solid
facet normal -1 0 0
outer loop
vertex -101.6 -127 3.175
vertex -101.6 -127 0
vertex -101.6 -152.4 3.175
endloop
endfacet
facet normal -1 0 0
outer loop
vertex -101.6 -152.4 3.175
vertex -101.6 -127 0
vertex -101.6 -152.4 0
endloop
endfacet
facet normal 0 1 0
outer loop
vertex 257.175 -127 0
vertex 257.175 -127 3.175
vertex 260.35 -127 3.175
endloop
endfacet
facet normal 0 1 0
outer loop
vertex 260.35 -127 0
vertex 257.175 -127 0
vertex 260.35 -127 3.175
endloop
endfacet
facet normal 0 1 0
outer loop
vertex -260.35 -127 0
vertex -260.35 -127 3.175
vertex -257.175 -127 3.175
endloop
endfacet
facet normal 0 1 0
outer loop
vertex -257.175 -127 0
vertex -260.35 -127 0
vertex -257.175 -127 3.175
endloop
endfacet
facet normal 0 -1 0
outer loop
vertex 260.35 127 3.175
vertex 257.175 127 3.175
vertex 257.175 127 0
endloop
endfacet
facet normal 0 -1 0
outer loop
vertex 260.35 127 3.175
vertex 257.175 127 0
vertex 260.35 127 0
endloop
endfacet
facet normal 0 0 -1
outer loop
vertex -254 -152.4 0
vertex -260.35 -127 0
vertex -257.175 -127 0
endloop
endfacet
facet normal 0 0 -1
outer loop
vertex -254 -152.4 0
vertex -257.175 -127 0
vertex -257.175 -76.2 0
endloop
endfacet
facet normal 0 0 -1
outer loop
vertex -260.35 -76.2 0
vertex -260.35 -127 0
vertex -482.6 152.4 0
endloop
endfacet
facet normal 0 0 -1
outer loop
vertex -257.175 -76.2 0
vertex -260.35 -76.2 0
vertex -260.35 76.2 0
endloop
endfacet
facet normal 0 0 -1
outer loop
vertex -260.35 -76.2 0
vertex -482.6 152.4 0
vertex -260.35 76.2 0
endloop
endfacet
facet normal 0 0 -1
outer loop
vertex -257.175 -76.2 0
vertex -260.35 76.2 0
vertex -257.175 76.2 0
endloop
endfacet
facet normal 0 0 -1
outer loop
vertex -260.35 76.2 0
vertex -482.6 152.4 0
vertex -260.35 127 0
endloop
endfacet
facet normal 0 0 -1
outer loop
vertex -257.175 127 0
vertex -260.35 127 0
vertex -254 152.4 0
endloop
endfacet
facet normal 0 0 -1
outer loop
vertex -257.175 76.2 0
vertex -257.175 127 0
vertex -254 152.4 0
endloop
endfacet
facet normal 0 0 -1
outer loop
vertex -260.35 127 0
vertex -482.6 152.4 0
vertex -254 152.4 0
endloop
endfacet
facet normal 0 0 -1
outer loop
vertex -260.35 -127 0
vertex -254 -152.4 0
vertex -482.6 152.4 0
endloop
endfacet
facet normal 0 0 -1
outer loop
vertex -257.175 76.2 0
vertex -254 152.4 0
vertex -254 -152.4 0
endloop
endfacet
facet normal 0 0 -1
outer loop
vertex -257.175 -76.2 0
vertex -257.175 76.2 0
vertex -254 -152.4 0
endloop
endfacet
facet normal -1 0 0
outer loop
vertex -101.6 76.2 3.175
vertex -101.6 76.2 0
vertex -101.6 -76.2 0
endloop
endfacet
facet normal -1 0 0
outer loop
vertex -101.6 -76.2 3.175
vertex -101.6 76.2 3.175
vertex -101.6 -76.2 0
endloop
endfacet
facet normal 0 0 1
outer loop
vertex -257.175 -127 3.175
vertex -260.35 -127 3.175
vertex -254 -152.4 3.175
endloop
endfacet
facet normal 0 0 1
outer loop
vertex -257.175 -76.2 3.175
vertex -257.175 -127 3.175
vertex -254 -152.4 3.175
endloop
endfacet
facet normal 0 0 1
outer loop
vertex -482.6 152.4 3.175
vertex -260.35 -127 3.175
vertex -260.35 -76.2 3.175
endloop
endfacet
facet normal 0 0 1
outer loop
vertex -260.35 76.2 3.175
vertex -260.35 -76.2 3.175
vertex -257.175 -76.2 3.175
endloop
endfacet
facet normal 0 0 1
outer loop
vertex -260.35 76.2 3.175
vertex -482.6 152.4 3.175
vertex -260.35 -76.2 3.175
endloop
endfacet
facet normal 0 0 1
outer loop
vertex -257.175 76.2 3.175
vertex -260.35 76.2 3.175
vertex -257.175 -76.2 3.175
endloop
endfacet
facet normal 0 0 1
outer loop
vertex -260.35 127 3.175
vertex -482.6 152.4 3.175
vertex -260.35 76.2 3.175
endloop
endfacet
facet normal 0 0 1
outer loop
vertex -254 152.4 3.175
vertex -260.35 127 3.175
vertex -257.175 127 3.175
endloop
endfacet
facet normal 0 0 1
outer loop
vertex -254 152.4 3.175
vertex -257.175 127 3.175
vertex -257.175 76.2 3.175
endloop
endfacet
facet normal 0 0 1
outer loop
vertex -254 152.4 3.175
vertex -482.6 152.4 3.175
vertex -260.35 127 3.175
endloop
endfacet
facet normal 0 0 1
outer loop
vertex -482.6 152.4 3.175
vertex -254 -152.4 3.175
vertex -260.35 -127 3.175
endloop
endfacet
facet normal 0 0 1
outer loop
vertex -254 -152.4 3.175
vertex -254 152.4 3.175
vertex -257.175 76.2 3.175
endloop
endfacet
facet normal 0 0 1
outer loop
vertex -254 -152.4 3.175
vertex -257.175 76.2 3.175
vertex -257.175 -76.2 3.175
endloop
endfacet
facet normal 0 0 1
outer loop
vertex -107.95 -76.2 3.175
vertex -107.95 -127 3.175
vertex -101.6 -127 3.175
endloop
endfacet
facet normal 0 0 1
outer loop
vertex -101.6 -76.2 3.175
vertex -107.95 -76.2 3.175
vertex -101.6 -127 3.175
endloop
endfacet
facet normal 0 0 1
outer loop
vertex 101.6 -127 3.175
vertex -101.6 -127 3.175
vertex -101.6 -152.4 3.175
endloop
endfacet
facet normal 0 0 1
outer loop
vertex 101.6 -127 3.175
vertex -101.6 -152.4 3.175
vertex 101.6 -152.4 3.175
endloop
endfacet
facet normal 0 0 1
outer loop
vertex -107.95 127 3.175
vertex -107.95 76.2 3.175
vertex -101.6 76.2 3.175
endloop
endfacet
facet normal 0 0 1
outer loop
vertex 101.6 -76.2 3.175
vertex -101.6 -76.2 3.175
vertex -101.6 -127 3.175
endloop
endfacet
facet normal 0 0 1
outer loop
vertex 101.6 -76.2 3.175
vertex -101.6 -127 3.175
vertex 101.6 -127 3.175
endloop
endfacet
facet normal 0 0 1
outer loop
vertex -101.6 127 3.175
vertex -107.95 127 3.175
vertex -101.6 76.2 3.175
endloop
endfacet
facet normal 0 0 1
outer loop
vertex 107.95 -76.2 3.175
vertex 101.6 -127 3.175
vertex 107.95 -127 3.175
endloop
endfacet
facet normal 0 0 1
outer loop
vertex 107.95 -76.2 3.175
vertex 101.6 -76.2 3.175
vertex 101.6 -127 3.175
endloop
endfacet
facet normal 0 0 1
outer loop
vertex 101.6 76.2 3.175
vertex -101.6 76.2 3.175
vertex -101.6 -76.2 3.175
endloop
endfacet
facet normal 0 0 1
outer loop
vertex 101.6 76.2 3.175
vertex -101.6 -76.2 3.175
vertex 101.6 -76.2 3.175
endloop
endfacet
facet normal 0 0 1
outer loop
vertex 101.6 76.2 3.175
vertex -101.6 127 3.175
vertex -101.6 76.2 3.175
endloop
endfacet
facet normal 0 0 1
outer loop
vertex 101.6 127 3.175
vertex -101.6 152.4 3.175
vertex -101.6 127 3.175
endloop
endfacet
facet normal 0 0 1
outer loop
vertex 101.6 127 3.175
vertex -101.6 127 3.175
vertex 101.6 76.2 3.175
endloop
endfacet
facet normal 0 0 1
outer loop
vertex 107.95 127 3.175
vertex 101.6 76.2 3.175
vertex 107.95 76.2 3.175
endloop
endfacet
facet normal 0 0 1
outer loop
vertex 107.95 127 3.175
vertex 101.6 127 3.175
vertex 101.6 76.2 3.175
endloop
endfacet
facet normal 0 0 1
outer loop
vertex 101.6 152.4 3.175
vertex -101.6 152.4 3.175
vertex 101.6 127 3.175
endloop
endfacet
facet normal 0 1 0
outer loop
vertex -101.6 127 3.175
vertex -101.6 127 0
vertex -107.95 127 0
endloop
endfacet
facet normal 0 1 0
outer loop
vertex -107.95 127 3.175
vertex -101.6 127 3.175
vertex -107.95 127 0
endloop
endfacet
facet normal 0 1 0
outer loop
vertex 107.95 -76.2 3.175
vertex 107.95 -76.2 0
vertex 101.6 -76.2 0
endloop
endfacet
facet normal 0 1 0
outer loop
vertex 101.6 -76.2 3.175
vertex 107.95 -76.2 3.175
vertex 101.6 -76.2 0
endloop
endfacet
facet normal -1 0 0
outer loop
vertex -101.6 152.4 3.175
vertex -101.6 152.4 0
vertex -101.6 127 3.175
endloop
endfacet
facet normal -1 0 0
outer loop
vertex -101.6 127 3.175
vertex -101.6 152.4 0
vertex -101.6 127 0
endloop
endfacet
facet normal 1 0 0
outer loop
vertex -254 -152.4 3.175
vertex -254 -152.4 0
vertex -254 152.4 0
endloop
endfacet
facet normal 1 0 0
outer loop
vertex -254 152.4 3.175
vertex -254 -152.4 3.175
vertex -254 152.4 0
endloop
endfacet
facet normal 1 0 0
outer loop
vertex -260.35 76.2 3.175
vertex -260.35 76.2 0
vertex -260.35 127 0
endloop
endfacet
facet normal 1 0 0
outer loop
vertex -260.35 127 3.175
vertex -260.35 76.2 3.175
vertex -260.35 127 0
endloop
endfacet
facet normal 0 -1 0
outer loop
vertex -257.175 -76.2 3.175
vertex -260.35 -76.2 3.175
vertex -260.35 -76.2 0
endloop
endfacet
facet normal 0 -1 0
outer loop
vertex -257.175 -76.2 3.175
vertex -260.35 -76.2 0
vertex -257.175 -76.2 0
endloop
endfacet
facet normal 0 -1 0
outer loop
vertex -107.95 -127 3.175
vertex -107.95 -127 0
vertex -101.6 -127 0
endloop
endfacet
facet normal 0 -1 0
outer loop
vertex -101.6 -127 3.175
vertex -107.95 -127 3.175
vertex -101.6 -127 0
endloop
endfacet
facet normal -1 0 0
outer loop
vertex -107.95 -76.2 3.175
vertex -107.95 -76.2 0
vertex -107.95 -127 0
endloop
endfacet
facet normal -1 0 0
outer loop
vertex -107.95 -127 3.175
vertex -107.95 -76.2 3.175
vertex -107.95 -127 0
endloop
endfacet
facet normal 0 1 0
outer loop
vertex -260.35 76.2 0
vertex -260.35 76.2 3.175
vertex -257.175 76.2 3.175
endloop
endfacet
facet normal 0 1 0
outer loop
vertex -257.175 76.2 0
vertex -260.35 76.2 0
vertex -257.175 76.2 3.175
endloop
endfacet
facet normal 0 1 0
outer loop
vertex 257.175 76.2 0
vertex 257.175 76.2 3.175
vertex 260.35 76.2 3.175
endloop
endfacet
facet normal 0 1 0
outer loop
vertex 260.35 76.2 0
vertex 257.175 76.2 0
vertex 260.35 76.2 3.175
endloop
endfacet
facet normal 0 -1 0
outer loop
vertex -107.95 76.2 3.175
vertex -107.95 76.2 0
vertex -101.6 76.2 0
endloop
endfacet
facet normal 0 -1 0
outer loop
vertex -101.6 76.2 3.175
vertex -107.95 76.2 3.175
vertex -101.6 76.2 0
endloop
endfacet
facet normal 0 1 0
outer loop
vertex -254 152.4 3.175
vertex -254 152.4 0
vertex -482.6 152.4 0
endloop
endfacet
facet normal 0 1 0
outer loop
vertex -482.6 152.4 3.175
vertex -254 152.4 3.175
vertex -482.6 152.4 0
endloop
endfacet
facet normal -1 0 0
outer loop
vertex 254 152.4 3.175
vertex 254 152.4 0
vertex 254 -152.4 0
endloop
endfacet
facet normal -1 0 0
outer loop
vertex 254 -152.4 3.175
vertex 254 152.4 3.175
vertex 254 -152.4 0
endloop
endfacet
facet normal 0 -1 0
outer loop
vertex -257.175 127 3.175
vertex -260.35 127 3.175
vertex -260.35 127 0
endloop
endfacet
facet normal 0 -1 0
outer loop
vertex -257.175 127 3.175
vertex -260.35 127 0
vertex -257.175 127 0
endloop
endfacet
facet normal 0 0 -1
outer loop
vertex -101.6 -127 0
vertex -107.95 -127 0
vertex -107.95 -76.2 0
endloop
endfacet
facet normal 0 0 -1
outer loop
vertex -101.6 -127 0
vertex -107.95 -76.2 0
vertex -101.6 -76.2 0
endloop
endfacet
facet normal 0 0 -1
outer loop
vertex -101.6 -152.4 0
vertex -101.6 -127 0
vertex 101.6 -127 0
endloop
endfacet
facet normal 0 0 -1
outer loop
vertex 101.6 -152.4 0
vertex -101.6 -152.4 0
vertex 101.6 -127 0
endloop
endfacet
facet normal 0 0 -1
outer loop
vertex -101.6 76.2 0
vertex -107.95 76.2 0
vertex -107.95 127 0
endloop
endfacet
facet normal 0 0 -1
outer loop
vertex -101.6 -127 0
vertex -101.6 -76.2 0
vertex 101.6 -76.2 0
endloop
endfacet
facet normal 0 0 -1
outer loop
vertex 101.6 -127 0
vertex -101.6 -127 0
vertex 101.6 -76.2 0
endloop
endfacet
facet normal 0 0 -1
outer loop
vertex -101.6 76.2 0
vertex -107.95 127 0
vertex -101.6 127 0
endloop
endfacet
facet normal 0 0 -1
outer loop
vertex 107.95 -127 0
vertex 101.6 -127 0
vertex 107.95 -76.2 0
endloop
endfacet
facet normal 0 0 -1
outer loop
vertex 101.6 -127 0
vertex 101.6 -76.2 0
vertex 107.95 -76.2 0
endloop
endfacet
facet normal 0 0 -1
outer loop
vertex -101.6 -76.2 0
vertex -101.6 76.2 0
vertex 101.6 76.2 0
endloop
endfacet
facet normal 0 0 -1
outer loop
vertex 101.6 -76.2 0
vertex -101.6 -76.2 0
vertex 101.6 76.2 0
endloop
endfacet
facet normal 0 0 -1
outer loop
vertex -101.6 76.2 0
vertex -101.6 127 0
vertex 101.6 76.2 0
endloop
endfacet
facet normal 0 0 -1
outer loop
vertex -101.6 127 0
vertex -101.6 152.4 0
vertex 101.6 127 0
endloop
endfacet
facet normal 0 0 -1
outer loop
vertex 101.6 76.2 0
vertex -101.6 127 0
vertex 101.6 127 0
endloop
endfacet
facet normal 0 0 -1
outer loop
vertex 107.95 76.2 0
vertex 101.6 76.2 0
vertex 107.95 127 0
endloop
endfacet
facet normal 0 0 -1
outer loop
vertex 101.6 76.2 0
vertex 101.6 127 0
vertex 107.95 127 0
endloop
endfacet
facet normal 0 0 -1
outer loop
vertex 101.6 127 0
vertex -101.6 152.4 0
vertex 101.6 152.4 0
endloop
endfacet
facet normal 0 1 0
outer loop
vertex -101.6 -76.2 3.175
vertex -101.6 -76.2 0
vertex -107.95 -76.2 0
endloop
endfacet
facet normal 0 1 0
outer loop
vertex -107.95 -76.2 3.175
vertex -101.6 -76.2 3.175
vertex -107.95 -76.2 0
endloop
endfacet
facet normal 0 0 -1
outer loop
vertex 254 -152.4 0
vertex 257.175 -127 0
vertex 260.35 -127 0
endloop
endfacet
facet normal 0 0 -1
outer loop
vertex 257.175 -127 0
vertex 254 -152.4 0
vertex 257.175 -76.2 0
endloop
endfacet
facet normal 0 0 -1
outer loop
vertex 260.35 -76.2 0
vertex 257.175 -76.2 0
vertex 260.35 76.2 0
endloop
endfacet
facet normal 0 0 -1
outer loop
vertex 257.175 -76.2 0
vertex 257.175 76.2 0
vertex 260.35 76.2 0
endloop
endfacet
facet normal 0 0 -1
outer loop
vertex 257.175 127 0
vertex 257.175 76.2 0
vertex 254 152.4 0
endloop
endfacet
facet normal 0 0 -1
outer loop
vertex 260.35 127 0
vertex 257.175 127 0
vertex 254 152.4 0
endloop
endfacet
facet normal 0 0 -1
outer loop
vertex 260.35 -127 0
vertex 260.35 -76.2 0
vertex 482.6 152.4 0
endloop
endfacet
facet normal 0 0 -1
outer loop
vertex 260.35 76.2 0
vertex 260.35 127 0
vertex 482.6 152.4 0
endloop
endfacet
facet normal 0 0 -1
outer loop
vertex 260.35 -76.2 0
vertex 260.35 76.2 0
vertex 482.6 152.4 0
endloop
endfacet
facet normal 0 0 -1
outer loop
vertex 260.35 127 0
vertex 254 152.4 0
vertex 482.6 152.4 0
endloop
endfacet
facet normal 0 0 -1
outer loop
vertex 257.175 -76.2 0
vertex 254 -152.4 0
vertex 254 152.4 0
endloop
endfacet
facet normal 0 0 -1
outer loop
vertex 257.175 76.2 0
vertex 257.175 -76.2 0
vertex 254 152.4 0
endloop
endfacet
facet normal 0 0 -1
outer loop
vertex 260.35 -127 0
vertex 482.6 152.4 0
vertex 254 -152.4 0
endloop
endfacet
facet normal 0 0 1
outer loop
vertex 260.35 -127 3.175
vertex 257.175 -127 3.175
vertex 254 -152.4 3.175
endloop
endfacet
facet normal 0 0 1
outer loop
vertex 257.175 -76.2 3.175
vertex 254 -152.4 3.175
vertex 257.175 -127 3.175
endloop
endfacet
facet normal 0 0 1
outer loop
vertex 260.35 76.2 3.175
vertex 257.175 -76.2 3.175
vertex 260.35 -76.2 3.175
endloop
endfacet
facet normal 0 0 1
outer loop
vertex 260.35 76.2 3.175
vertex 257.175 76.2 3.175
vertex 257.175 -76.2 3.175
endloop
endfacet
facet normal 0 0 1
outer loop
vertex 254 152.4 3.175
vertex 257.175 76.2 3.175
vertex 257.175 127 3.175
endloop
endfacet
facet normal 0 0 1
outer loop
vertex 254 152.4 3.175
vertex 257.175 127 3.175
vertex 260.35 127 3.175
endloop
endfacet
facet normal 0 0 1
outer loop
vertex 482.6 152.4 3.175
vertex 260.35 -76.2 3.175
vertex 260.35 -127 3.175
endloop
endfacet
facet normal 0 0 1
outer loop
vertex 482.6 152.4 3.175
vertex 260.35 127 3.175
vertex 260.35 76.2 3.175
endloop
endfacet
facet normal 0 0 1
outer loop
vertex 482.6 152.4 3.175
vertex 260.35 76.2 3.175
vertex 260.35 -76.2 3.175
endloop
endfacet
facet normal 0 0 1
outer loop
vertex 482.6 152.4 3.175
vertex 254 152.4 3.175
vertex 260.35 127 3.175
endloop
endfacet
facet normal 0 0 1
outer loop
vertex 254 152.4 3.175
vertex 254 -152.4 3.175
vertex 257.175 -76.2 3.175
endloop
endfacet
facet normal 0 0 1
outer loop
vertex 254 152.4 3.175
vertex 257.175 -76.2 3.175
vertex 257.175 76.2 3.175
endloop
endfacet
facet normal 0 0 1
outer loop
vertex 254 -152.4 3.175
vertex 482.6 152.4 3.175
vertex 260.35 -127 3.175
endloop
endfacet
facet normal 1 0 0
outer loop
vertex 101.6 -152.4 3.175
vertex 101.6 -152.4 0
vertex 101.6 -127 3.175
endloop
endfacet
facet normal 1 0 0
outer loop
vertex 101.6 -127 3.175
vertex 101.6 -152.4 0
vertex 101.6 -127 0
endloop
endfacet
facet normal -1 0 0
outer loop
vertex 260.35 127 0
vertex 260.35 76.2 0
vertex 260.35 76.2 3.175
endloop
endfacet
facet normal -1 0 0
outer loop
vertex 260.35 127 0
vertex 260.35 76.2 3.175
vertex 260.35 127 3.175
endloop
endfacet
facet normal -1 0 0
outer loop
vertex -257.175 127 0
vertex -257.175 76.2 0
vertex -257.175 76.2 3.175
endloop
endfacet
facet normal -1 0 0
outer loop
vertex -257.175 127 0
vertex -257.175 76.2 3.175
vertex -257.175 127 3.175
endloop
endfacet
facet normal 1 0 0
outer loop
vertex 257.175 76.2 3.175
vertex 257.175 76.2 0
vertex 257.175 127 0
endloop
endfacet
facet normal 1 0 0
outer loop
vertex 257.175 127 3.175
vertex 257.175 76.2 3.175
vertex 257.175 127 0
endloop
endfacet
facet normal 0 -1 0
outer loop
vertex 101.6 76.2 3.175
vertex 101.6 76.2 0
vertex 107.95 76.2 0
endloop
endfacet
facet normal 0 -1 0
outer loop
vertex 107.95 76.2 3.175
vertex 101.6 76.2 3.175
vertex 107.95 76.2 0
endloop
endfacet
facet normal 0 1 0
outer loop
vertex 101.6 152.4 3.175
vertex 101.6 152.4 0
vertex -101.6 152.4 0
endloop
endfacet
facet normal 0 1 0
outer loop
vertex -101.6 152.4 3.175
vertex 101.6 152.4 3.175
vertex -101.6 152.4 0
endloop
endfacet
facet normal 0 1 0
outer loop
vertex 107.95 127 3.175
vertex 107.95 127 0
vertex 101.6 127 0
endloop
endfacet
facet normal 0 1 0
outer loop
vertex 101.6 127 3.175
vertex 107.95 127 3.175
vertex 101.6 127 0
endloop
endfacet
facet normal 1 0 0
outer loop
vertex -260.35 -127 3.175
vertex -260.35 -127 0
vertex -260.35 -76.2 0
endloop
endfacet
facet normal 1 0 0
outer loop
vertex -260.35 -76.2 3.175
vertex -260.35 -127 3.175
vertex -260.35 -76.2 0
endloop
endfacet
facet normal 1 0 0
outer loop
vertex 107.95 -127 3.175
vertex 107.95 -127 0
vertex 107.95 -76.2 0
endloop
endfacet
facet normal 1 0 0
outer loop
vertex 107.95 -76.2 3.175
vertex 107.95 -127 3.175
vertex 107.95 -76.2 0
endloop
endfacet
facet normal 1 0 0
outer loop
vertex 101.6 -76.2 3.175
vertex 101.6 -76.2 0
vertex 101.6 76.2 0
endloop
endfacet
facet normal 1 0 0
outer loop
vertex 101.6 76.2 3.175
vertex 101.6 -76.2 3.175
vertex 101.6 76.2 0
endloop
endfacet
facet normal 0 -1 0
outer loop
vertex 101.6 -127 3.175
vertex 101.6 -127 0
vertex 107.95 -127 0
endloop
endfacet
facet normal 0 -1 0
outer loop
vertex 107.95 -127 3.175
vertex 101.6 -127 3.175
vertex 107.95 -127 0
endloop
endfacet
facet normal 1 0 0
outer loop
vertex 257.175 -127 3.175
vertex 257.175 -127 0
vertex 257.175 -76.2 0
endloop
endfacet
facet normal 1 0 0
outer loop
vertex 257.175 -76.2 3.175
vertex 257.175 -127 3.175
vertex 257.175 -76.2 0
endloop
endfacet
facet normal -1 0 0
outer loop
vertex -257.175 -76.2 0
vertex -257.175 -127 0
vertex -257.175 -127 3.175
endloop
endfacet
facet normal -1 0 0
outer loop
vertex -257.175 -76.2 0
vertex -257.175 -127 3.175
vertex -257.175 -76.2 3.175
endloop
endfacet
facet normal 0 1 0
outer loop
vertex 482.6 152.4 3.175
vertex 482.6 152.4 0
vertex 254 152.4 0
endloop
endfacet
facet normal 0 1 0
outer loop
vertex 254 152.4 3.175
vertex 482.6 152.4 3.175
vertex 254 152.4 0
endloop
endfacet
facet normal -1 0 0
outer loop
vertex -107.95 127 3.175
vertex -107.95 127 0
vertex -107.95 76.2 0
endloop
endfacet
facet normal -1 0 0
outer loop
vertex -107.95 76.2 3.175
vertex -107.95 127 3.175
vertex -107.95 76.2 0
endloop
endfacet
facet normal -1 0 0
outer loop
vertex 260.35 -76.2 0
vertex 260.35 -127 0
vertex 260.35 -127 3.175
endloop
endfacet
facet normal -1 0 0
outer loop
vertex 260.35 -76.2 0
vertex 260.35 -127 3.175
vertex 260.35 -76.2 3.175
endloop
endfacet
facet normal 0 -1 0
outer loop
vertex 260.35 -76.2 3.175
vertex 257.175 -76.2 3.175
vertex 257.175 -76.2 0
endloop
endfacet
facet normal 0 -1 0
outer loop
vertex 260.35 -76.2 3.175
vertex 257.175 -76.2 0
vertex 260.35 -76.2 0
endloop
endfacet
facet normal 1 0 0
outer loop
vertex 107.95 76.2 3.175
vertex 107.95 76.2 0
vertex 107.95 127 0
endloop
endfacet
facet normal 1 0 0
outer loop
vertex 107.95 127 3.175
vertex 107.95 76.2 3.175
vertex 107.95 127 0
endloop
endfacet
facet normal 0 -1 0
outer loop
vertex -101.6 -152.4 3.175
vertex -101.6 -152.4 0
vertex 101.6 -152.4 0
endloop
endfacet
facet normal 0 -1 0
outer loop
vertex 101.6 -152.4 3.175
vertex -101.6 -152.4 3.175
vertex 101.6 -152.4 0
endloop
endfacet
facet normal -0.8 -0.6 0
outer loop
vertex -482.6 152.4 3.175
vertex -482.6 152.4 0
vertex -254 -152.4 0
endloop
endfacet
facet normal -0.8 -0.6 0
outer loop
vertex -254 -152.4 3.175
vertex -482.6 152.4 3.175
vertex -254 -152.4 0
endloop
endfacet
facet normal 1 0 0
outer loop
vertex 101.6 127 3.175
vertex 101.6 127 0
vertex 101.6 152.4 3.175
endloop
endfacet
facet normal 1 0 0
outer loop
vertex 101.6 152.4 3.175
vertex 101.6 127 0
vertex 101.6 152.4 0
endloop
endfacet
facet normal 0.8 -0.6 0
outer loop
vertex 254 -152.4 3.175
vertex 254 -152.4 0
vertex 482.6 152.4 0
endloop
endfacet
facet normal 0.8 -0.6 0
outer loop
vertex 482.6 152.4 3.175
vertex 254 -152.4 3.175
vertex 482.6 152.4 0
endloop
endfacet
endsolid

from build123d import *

# Parameters (mm, degrees)
F0_W     = 3.175
F0_H     = 50.8
F1_DEPTH = 3.175


with BuildPart() as f1:
    # F0 (on Top) → F1 (new body)
    with BuildSketch(Plane.XY):
        Polygon((101.6, 152.4), (0, 152.4), (-101.6, 152.4), (-101.6, 127), (-107.95, 127), (-107.95, 76.2), (-101.6, 76.2), (-101.6, 0), (-101.6, -76.2), (-107.95, -76.2), (-107.95, -127), (-101.6, -127), (-101.6, -152.4), (0, -152.4), (101.6, -152.4), (101.6, -127), (107.95, -127), (107.95, -76.2), (101.6, -76.2), (101.6, 0), (101.6, 76.2), (107.95, 76.2), (107.95, 127), (101.6, 127), align=None)
        Polygon((-482.6, 152.4), (-254, -152.4), (-254, 152.4), align=None)
        with Locations((-258.7625, -101.6)):
            Rectangle(F0_W, F0_H, mode=Mode.SUBTRACT)
        with Locations((-258.7625, 101.6)):
            Rectangle(F0_W, F0_H, mode=Mode.SUBTRACT)
        Polygon((254, 152.4), (254, -152.4), (482.6, 152.4), align=None)
        with Locations((258.7625, -101.6)):
            Rectangle(F0_W, F0_H, mode=Mode.SUBTRACT)
        with Locations((258.7625, 101.6)):
            Rectangle(F0_W, F0_H, mode=Mode.SUBTRACT)
    extrude(amount=F1_DEPTH)


solid = f1.part
